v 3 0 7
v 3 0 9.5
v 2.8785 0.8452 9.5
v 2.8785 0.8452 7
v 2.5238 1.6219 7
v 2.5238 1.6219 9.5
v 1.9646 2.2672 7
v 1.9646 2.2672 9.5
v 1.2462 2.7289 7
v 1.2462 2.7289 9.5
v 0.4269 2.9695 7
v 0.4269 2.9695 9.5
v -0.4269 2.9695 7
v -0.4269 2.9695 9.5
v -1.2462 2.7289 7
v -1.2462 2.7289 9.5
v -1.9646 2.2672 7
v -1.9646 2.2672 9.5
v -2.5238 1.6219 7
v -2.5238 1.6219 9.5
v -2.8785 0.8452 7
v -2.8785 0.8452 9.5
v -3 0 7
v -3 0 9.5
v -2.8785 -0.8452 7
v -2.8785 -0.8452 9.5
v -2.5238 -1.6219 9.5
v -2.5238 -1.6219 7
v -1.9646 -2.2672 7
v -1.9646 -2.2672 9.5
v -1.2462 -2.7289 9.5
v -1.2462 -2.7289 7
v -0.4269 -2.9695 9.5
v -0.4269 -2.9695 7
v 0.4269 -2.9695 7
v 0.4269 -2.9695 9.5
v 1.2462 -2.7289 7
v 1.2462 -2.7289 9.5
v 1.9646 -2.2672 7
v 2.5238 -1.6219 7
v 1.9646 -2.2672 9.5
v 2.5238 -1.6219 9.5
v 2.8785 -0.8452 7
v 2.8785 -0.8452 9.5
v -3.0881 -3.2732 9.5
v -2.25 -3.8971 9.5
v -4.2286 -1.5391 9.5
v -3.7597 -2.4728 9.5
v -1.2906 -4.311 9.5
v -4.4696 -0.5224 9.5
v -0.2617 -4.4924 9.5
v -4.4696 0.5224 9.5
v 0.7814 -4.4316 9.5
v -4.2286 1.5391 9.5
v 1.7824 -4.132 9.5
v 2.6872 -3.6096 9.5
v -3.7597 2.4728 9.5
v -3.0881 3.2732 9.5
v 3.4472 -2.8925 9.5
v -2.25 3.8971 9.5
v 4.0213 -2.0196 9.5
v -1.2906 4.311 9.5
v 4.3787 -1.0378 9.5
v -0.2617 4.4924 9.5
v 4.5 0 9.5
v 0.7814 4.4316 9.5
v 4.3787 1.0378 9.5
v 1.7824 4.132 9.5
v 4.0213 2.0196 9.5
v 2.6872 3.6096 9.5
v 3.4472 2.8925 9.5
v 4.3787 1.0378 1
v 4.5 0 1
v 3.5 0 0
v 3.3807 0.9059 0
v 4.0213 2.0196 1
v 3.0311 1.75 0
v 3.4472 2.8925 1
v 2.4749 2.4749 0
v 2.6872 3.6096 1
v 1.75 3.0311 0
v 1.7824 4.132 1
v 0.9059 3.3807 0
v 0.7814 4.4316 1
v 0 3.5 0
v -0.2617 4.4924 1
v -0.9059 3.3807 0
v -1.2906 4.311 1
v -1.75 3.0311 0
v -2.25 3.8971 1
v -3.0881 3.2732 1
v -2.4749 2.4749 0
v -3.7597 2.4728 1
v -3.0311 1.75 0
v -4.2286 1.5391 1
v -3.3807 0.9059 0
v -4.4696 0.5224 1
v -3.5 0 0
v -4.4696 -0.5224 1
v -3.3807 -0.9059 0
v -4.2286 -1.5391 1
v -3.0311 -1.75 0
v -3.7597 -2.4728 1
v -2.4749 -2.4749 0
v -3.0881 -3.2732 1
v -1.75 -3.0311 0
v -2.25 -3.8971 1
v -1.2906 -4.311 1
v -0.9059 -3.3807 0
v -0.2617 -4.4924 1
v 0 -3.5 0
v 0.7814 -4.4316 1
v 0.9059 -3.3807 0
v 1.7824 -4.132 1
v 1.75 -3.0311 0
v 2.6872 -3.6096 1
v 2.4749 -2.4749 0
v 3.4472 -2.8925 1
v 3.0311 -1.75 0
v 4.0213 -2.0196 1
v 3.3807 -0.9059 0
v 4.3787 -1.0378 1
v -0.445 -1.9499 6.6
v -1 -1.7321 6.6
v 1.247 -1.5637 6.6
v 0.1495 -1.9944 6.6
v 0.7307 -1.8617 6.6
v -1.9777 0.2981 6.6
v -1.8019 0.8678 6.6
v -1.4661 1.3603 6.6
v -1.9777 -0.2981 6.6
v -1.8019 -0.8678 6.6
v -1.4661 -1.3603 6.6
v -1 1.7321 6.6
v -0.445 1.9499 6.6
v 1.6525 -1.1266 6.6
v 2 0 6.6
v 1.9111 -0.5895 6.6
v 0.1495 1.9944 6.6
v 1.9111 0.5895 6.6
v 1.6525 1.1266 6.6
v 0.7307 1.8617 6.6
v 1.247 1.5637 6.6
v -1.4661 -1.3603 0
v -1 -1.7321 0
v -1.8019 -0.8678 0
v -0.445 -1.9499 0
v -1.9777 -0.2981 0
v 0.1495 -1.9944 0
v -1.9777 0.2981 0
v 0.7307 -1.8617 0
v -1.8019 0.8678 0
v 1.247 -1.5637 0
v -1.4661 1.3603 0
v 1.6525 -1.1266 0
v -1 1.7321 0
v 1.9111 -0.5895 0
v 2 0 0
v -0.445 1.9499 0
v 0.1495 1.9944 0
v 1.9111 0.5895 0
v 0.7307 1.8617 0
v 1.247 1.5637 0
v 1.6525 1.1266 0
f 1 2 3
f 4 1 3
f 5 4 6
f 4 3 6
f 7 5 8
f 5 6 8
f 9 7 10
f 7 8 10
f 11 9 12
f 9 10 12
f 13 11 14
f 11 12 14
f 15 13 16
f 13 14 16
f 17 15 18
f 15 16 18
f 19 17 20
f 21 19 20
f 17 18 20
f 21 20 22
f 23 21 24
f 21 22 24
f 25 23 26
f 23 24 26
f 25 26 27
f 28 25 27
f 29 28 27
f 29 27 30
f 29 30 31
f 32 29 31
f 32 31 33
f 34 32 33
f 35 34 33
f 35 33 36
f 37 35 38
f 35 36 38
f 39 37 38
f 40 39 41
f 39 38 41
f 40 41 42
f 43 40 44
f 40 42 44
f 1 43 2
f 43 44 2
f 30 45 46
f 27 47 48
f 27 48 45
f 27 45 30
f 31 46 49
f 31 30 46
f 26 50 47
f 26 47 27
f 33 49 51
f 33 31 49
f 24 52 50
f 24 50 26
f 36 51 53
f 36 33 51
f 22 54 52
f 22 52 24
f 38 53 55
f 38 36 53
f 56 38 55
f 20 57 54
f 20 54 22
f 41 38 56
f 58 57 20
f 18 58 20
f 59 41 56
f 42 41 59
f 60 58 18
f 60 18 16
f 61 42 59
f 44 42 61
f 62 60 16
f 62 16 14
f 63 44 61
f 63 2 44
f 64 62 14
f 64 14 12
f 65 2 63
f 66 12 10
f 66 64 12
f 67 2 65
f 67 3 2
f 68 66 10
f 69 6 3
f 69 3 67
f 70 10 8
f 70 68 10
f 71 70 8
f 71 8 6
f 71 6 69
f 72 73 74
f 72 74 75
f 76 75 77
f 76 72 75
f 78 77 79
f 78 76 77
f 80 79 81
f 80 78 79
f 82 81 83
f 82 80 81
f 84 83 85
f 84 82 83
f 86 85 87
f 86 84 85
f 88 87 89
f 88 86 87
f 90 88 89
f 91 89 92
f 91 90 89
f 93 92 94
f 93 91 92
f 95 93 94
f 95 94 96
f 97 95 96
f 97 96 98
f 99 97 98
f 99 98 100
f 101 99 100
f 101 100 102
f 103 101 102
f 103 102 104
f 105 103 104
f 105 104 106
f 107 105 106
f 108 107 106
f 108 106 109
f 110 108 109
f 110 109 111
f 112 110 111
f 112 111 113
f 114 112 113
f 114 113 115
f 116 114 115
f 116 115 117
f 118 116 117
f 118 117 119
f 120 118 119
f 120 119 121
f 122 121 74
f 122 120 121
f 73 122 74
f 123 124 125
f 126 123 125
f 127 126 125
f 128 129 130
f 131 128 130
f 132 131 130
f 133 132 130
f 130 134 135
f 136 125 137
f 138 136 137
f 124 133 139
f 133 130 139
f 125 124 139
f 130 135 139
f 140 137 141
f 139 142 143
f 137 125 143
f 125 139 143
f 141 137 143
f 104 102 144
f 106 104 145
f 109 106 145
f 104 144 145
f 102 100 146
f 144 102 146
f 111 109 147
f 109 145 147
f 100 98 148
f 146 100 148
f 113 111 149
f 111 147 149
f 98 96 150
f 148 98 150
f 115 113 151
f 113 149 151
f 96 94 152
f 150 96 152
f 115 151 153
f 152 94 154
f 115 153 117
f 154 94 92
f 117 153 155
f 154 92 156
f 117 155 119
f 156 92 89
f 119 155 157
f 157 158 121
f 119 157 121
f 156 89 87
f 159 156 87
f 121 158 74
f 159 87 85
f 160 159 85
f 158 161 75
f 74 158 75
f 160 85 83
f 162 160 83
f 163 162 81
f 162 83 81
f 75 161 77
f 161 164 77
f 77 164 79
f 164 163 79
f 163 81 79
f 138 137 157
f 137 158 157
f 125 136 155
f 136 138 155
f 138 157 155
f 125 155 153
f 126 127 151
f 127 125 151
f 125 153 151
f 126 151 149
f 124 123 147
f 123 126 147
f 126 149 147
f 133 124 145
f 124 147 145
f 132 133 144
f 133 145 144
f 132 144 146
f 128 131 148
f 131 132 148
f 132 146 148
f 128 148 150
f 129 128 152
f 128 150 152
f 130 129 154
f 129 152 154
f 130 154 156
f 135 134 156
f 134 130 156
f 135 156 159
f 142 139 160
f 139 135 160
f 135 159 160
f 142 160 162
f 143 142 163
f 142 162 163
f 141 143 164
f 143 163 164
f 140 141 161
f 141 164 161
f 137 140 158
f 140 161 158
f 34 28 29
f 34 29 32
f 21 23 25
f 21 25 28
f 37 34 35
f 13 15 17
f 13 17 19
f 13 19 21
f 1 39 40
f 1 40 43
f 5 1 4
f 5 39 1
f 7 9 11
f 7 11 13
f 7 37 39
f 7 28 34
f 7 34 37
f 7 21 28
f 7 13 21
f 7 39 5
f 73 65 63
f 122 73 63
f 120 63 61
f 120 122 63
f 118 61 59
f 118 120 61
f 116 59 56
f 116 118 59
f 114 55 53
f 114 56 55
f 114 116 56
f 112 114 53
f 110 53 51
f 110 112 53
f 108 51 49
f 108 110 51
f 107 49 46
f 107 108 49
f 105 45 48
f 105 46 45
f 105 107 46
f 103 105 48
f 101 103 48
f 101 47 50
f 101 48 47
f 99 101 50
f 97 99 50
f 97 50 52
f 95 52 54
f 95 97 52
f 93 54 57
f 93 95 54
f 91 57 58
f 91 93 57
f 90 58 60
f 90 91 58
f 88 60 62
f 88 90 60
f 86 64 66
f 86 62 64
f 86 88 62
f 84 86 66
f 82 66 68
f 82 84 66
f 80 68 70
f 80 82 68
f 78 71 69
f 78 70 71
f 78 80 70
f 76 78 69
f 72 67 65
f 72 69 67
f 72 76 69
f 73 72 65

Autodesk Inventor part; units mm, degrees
ref_plane "YZ Plane" through (0, 0, 0) normal (1, 0, 0) x (0, 1, 0)
ref_plane "XZ Plane" through (0, 0, 0) normal (0, 1, 0) x (-1, 0, 0)
ref_plane "XY Plane" through (0, 0, 0) normal (0, 0, 1) x (1, 0, 0)
sketch "Skizze1" plane through (0, 0, 0) normal (0, 0, 1) x (1, 0, 0)
  circle A0 centre (0, 0) radius 2
  circle A1 centre (0, 0) radius 4.5
  dimension "d0" = 9
  dimension "d1" = 4
extrude "Extrusion1" add sketch "Skizze1" along normal blind 9.5
sketch "Skizze2" plane through (0, 0, 9.5) normal (0, 0, 1) x (1, 0, 0)
  circle A0 centre (0, 0) radius 3
  dimension "d4" = 6
extrude "Extrusion2" cut sketch "Skizze2" against normal blind 2.5
chamfer "Fase1" distance 1 angle 45 1 edges at (-4.5, 0, 0)
sketch "Skizze3" plane through (0, 0, 7) normal (0, 0, 1) x (1, 0, 0)
  circle A0 centre (0, 0) radius 2 projected
  circle A1 centre (0, 0) radius 3 projected
extrude "Extrusion3" add sketch "Skizze3" against normal blind 0.4 contours A0
properties part number "Mag4mmWelle" material "ABS-Kunststoff"
